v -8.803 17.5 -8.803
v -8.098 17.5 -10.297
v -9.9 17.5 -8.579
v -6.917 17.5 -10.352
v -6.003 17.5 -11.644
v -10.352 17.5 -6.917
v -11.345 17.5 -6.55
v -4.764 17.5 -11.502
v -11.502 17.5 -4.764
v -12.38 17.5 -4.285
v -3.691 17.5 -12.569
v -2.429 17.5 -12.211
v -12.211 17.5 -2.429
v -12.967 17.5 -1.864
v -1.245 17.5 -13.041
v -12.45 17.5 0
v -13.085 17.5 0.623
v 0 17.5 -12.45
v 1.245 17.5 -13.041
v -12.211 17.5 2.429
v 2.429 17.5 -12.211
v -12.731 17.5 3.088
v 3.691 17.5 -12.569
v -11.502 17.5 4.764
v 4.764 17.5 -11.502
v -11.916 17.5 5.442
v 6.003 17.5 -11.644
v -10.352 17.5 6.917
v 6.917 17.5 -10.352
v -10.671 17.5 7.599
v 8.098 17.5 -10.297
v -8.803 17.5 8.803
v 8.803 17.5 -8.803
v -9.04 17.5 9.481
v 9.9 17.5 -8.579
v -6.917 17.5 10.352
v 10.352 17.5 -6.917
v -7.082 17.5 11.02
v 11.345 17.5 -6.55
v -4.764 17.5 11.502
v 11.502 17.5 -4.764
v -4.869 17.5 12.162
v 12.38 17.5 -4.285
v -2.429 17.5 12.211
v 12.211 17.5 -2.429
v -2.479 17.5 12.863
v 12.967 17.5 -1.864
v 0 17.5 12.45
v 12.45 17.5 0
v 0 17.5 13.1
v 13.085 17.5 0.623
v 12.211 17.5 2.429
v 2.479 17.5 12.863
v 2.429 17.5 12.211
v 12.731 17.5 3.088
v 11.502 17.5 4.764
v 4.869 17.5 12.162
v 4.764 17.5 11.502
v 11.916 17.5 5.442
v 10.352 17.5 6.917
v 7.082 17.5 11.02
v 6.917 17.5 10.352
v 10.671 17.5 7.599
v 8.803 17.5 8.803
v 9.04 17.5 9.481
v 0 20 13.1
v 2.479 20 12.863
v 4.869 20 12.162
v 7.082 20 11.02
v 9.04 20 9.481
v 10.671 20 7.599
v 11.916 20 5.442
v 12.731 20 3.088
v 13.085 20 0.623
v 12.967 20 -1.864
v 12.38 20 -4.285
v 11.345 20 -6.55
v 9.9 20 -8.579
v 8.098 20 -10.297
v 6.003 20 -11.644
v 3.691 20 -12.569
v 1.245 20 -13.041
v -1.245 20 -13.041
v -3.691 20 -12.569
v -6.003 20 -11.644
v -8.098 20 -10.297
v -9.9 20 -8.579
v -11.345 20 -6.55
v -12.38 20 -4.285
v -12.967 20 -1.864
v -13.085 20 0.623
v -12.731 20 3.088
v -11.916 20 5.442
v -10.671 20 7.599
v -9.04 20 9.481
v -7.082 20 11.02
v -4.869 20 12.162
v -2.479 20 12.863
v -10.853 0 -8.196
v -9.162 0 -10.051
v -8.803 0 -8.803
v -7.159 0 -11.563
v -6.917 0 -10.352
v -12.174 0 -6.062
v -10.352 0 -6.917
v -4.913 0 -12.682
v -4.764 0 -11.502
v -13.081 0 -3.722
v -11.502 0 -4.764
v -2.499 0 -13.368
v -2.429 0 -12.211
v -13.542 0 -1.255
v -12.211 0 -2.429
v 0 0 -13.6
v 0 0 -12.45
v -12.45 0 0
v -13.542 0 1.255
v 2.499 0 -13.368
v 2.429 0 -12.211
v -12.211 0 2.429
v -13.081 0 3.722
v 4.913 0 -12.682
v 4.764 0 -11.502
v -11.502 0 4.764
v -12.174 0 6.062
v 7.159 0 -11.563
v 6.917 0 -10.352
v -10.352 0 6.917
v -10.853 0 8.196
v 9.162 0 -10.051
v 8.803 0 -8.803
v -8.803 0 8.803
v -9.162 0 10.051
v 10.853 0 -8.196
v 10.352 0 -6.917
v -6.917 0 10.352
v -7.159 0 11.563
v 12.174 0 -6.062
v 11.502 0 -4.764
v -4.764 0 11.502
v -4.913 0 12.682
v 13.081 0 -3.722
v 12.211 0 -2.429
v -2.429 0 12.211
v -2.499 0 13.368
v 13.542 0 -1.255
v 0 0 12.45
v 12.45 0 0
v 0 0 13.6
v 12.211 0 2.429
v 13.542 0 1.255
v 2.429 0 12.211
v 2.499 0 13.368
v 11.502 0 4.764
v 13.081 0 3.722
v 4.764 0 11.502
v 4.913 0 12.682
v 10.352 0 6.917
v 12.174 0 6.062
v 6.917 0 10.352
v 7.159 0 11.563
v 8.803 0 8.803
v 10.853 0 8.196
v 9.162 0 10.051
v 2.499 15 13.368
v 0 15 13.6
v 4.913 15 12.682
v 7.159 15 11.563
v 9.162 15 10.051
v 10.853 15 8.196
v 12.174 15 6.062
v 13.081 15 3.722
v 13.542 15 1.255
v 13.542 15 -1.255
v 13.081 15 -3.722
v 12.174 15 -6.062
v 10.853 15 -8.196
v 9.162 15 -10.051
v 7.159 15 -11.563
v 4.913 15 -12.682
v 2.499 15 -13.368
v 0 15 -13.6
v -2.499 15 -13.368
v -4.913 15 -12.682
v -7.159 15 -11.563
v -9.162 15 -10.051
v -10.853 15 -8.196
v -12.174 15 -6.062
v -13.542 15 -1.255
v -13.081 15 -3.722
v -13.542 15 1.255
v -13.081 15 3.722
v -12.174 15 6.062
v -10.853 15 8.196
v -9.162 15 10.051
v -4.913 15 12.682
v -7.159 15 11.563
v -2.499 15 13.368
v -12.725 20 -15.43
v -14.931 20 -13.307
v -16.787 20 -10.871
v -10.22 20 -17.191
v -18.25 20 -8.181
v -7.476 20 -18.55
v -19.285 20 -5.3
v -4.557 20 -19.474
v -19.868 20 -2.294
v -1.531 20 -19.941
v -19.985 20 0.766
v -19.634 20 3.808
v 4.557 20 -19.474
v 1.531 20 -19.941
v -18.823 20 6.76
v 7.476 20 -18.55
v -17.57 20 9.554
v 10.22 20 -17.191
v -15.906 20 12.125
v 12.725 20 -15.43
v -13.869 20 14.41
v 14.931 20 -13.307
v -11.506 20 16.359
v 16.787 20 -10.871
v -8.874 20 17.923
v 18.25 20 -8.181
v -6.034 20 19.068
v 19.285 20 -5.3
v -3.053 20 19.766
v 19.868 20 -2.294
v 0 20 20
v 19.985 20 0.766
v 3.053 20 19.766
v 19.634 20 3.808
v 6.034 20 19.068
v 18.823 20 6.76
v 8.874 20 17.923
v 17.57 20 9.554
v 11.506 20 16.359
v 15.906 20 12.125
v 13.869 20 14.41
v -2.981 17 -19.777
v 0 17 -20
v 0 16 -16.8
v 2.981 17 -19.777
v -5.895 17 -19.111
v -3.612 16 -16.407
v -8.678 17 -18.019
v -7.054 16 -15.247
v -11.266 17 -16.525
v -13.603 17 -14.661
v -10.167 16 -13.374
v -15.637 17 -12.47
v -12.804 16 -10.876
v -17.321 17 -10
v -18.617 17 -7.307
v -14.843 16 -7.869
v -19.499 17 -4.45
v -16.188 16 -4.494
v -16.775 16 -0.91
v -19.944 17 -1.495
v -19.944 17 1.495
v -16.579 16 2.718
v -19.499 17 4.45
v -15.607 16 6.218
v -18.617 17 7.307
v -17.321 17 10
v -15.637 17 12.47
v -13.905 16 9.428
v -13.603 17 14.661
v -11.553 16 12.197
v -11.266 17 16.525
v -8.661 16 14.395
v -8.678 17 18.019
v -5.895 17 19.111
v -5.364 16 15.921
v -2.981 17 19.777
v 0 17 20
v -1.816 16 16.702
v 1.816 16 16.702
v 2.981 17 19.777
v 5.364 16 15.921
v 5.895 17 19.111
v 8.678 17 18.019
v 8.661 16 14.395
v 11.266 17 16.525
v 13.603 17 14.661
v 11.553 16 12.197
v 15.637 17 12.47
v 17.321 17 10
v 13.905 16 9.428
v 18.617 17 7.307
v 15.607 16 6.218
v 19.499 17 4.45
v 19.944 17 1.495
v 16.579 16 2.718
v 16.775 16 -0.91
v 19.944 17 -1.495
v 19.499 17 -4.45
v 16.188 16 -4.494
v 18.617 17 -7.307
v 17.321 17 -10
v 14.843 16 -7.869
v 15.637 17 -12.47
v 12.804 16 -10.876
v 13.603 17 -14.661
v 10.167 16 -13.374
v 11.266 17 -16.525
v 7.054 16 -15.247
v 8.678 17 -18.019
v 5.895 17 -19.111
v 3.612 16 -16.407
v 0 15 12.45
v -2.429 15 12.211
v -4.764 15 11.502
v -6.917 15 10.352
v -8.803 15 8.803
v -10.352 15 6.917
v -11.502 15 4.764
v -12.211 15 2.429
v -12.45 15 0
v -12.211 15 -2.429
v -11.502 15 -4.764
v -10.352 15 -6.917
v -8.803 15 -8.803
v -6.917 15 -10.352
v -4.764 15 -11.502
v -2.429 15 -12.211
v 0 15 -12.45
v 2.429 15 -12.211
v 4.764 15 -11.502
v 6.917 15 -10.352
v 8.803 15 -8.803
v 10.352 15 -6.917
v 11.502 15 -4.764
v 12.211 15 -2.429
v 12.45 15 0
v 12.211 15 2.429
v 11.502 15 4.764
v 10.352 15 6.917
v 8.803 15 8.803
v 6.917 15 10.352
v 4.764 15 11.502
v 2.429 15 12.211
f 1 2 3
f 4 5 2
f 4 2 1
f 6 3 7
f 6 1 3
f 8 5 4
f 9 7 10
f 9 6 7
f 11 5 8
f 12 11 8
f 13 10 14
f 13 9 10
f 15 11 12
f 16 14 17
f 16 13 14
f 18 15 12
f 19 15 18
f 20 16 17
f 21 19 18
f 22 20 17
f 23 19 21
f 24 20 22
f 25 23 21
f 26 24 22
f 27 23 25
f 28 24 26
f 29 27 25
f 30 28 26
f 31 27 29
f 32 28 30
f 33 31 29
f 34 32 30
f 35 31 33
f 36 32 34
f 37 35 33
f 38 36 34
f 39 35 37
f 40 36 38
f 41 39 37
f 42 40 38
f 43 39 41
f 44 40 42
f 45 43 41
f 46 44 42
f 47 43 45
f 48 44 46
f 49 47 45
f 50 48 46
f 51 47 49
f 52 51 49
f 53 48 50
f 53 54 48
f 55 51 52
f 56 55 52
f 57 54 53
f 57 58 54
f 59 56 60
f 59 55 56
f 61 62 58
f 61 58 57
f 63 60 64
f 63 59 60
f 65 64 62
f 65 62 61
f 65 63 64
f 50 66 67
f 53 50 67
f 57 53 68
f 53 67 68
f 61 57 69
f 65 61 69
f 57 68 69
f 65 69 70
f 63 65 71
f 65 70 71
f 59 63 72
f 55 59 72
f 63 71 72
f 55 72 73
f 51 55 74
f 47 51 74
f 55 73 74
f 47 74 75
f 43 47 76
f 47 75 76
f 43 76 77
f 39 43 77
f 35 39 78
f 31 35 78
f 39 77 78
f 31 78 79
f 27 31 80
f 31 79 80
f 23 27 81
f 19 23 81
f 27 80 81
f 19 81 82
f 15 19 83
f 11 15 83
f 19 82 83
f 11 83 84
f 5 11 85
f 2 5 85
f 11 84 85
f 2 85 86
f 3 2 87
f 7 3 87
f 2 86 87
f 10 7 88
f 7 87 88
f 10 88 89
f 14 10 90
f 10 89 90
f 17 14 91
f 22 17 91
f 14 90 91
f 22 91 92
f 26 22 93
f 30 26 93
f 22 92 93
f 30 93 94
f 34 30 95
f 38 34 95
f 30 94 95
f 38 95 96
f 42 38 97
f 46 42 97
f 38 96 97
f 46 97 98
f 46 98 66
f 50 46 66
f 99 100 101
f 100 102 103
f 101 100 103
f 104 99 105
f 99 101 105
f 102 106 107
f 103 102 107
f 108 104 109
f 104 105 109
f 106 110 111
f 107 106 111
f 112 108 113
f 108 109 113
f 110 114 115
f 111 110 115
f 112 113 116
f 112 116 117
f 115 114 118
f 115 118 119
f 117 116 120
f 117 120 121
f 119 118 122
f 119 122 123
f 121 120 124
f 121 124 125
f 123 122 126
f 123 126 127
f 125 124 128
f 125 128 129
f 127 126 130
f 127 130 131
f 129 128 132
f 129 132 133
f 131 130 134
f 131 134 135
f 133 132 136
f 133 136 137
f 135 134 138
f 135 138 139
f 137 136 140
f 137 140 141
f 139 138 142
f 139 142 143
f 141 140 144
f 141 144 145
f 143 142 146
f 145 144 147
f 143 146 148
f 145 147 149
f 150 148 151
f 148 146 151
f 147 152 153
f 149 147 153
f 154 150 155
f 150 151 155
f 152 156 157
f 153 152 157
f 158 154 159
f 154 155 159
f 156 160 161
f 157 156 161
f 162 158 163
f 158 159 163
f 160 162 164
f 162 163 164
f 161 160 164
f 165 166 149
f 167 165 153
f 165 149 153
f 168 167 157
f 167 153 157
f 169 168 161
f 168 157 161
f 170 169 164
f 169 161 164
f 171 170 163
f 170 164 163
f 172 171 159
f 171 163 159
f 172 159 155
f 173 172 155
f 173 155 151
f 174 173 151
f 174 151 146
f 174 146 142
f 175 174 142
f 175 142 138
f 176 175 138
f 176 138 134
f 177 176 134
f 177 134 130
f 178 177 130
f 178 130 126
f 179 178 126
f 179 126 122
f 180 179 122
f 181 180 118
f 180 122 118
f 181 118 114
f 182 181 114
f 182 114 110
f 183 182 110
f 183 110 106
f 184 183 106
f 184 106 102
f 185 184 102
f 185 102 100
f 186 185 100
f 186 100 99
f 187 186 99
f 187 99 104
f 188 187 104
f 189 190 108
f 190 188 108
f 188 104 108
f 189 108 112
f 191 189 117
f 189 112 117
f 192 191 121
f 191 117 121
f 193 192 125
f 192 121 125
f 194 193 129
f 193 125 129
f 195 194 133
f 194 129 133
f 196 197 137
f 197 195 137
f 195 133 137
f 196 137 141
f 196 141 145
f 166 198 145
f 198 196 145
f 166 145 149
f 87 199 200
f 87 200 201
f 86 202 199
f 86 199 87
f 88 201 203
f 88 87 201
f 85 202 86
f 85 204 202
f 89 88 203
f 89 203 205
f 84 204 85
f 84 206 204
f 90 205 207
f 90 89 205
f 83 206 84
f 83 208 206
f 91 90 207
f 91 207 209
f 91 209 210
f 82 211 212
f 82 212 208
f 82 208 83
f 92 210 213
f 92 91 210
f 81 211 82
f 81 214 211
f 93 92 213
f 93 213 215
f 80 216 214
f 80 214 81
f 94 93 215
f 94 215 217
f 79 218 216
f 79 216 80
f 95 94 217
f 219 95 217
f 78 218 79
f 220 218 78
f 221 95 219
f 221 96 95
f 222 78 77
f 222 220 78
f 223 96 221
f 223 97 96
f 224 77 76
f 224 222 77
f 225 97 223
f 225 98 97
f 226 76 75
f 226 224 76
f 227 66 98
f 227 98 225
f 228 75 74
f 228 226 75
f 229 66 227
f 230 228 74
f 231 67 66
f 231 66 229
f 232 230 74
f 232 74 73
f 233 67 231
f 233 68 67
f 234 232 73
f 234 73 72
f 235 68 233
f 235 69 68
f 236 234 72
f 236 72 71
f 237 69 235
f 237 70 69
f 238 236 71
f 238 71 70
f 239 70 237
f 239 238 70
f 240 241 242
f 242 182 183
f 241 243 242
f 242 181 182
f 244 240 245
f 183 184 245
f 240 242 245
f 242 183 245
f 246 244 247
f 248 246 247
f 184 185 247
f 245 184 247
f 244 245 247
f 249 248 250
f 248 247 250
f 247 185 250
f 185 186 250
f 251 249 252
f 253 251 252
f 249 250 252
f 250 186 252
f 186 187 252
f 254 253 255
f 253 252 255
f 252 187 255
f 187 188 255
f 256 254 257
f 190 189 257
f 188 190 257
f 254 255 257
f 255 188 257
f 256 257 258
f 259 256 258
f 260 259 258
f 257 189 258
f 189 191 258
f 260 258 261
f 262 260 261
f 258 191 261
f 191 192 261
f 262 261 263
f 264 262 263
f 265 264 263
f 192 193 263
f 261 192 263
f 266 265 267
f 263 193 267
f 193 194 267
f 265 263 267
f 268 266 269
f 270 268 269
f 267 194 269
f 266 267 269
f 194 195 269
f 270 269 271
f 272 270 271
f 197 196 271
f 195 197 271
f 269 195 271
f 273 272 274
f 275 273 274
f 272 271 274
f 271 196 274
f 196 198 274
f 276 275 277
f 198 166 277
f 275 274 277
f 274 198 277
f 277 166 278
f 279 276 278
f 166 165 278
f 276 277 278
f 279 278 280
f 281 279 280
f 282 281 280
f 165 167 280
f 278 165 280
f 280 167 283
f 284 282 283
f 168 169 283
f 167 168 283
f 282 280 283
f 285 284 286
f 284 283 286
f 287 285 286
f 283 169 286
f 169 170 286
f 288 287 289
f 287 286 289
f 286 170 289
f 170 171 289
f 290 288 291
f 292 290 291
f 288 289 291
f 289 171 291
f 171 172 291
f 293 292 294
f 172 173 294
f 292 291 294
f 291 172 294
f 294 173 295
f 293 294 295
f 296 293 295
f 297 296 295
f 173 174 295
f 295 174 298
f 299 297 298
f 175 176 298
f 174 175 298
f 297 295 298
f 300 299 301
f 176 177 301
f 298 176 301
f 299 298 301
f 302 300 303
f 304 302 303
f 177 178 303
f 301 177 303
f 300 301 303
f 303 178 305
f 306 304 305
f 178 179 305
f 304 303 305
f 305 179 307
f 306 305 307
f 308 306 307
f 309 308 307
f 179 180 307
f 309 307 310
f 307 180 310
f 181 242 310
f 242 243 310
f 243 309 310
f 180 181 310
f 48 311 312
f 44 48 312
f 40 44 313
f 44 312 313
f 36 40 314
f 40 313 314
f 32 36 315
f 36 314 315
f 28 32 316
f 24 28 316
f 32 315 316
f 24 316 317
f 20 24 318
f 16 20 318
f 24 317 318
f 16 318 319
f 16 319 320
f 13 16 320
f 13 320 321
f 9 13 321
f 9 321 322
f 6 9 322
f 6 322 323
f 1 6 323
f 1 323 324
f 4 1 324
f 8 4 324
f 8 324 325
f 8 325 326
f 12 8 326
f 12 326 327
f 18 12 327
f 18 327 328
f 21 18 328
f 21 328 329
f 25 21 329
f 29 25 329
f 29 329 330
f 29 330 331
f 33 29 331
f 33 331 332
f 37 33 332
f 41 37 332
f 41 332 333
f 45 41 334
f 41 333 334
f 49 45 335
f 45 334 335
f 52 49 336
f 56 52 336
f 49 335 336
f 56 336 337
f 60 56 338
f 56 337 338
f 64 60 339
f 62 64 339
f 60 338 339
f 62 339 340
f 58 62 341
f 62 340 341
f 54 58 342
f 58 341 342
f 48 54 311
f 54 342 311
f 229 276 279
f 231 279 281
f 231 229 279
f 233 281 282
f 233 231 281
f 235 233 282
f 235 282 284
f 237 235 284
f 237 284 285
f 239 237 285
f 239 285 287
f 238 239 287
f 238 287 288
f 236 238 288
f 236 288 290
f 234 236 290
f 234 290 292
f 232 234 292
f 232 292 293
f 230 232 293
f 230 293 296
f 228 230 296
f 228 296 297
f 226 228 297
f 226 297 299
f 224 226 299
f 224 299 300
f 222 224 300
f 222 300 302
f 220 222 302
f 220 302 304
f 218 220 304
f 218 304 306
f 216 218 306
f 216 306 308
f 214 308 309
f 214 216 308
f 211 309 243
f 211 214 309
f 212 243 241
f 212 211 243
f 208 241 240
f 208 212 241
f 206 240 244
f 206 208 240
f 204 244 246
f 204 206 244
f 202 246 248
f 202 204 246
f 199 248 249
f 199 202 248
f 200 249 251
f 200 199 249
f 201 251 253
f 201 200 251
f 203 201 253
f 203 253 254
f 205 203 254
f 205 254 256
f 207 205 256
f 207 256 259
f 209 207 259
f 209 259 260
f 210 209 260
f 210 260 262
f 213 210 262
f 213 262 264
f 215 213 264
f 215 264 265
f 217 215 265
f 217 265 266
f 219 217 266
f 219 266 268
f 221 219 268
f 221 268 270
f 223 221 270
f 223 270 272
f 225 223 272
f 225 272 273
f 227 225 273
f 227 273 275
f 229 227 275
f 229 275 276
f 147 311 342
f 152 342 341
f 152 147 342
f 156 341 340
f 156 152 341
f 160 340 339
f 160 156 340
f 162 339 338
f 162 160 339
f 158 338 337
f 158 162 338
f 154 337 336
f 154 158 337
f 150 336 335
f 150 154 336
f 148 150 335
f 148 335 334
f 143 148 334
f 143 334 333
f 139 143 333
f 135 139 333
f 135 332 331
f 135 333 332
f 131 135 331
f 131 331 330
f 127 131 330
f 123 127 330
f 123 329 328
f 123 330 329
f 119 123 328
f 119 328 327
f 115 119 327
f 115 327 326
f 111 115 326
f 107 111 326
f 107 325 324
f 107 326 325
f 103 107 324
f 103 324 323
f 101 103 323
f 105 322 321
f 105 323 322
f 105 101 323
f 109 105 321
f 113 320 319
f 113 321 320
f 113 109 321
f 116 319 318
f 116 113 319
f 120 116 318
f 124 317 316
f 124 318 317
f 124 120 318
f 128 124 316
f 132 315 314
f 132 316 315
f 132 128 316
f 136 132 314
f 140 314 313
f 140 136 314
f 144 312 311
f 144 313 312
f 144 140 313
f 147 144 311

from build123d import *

# Parameters (mm, degrees)
SKETCH_1_R          = 13.6
SKETCH_1_R_2        = 12.45
EXTRUDE_1_DEPTH     = 20
SKETCH_2_R          = 20
EXTRUDE_2_DEPTH     = 5
SKETCH_3_R          = 13.1
CUT_EXTRUDE_1_DEPTH = 2.5
SKETCH_4_R          = 12.45
CUT_EXTRUDE_2_DEPTH = 10


with BuildPart() as part:
    # 草图1 → 凸台-拉伸1 (new body)
    with BuildSketch(Plane(origin=(0, 0, 0), x_dir=(1, 0, 0), z_dir=(0, 1, 0))):
        with Locations(Location((0, 0, 0), (0, 0, 270))):
            Circle(SKETCH_1_R)
        with Locations(Location((0, 0, 0), (0, 0, 270))):
            Circle(SKETCH_1_R_2, mode=Mode.SUBTRACT)
    extrude(amount=EXTRUDE_1_DEPTH)

    # 草图2 → 凸台-拉伸2 (add)
    with BuildSketch(Plane(origin=(0, 20, 0), x_dir=(1, 0, 0), z_dir=(0, 1, 0))):
        with Locations(Location((0, 0, 0), (0, 0, 270))):
            Circle(SKETCH_2_R)
    extrude(amount=-EXTRUDE_2_DEPTH)

    # 草图3 → 切除-拉伸1 (cut)
    with BuildSketch(Plane(origin=(0, 20, 0), x_dir=(1, 0, 0), z_dir=(0, 1, 0))):
        with Locations(Location((0, 0, 0), (0, 0, 270))):
            Circle(SKETCH_3_R)
    extrude(amount=-CUT_EXTRUDE_1_DEPTH, mode=Mode.SUBTRACT)

    # 草图4 → 切除-拉伸2 (cut)
    with BuildSketch(Plane.XZ.offset(-15)):
        with Locations(Location((0, 0, 0), (0, 0, 90))):
            Circle(SKETCH_4_R)
    extrude(amount=-CUT_EXTRUDE_2_DEPTH, mode=Mode.SUBTRACT)

    # 草图5 → 切除-旋转2 (revolve, cut)
    with BuildSketch(Plane(origin=(0, 0, 0), x_dir=(0, 0, -1), z_dir=(1, 0, 0))):
        Polygon((20, 17), (13.6, 15), (20, 15), align=None)
    revolve(axis=Axis((0, 0, 0), (0, 1, 0)), mode=Mode.SUBTRACT)


solid = part.part
